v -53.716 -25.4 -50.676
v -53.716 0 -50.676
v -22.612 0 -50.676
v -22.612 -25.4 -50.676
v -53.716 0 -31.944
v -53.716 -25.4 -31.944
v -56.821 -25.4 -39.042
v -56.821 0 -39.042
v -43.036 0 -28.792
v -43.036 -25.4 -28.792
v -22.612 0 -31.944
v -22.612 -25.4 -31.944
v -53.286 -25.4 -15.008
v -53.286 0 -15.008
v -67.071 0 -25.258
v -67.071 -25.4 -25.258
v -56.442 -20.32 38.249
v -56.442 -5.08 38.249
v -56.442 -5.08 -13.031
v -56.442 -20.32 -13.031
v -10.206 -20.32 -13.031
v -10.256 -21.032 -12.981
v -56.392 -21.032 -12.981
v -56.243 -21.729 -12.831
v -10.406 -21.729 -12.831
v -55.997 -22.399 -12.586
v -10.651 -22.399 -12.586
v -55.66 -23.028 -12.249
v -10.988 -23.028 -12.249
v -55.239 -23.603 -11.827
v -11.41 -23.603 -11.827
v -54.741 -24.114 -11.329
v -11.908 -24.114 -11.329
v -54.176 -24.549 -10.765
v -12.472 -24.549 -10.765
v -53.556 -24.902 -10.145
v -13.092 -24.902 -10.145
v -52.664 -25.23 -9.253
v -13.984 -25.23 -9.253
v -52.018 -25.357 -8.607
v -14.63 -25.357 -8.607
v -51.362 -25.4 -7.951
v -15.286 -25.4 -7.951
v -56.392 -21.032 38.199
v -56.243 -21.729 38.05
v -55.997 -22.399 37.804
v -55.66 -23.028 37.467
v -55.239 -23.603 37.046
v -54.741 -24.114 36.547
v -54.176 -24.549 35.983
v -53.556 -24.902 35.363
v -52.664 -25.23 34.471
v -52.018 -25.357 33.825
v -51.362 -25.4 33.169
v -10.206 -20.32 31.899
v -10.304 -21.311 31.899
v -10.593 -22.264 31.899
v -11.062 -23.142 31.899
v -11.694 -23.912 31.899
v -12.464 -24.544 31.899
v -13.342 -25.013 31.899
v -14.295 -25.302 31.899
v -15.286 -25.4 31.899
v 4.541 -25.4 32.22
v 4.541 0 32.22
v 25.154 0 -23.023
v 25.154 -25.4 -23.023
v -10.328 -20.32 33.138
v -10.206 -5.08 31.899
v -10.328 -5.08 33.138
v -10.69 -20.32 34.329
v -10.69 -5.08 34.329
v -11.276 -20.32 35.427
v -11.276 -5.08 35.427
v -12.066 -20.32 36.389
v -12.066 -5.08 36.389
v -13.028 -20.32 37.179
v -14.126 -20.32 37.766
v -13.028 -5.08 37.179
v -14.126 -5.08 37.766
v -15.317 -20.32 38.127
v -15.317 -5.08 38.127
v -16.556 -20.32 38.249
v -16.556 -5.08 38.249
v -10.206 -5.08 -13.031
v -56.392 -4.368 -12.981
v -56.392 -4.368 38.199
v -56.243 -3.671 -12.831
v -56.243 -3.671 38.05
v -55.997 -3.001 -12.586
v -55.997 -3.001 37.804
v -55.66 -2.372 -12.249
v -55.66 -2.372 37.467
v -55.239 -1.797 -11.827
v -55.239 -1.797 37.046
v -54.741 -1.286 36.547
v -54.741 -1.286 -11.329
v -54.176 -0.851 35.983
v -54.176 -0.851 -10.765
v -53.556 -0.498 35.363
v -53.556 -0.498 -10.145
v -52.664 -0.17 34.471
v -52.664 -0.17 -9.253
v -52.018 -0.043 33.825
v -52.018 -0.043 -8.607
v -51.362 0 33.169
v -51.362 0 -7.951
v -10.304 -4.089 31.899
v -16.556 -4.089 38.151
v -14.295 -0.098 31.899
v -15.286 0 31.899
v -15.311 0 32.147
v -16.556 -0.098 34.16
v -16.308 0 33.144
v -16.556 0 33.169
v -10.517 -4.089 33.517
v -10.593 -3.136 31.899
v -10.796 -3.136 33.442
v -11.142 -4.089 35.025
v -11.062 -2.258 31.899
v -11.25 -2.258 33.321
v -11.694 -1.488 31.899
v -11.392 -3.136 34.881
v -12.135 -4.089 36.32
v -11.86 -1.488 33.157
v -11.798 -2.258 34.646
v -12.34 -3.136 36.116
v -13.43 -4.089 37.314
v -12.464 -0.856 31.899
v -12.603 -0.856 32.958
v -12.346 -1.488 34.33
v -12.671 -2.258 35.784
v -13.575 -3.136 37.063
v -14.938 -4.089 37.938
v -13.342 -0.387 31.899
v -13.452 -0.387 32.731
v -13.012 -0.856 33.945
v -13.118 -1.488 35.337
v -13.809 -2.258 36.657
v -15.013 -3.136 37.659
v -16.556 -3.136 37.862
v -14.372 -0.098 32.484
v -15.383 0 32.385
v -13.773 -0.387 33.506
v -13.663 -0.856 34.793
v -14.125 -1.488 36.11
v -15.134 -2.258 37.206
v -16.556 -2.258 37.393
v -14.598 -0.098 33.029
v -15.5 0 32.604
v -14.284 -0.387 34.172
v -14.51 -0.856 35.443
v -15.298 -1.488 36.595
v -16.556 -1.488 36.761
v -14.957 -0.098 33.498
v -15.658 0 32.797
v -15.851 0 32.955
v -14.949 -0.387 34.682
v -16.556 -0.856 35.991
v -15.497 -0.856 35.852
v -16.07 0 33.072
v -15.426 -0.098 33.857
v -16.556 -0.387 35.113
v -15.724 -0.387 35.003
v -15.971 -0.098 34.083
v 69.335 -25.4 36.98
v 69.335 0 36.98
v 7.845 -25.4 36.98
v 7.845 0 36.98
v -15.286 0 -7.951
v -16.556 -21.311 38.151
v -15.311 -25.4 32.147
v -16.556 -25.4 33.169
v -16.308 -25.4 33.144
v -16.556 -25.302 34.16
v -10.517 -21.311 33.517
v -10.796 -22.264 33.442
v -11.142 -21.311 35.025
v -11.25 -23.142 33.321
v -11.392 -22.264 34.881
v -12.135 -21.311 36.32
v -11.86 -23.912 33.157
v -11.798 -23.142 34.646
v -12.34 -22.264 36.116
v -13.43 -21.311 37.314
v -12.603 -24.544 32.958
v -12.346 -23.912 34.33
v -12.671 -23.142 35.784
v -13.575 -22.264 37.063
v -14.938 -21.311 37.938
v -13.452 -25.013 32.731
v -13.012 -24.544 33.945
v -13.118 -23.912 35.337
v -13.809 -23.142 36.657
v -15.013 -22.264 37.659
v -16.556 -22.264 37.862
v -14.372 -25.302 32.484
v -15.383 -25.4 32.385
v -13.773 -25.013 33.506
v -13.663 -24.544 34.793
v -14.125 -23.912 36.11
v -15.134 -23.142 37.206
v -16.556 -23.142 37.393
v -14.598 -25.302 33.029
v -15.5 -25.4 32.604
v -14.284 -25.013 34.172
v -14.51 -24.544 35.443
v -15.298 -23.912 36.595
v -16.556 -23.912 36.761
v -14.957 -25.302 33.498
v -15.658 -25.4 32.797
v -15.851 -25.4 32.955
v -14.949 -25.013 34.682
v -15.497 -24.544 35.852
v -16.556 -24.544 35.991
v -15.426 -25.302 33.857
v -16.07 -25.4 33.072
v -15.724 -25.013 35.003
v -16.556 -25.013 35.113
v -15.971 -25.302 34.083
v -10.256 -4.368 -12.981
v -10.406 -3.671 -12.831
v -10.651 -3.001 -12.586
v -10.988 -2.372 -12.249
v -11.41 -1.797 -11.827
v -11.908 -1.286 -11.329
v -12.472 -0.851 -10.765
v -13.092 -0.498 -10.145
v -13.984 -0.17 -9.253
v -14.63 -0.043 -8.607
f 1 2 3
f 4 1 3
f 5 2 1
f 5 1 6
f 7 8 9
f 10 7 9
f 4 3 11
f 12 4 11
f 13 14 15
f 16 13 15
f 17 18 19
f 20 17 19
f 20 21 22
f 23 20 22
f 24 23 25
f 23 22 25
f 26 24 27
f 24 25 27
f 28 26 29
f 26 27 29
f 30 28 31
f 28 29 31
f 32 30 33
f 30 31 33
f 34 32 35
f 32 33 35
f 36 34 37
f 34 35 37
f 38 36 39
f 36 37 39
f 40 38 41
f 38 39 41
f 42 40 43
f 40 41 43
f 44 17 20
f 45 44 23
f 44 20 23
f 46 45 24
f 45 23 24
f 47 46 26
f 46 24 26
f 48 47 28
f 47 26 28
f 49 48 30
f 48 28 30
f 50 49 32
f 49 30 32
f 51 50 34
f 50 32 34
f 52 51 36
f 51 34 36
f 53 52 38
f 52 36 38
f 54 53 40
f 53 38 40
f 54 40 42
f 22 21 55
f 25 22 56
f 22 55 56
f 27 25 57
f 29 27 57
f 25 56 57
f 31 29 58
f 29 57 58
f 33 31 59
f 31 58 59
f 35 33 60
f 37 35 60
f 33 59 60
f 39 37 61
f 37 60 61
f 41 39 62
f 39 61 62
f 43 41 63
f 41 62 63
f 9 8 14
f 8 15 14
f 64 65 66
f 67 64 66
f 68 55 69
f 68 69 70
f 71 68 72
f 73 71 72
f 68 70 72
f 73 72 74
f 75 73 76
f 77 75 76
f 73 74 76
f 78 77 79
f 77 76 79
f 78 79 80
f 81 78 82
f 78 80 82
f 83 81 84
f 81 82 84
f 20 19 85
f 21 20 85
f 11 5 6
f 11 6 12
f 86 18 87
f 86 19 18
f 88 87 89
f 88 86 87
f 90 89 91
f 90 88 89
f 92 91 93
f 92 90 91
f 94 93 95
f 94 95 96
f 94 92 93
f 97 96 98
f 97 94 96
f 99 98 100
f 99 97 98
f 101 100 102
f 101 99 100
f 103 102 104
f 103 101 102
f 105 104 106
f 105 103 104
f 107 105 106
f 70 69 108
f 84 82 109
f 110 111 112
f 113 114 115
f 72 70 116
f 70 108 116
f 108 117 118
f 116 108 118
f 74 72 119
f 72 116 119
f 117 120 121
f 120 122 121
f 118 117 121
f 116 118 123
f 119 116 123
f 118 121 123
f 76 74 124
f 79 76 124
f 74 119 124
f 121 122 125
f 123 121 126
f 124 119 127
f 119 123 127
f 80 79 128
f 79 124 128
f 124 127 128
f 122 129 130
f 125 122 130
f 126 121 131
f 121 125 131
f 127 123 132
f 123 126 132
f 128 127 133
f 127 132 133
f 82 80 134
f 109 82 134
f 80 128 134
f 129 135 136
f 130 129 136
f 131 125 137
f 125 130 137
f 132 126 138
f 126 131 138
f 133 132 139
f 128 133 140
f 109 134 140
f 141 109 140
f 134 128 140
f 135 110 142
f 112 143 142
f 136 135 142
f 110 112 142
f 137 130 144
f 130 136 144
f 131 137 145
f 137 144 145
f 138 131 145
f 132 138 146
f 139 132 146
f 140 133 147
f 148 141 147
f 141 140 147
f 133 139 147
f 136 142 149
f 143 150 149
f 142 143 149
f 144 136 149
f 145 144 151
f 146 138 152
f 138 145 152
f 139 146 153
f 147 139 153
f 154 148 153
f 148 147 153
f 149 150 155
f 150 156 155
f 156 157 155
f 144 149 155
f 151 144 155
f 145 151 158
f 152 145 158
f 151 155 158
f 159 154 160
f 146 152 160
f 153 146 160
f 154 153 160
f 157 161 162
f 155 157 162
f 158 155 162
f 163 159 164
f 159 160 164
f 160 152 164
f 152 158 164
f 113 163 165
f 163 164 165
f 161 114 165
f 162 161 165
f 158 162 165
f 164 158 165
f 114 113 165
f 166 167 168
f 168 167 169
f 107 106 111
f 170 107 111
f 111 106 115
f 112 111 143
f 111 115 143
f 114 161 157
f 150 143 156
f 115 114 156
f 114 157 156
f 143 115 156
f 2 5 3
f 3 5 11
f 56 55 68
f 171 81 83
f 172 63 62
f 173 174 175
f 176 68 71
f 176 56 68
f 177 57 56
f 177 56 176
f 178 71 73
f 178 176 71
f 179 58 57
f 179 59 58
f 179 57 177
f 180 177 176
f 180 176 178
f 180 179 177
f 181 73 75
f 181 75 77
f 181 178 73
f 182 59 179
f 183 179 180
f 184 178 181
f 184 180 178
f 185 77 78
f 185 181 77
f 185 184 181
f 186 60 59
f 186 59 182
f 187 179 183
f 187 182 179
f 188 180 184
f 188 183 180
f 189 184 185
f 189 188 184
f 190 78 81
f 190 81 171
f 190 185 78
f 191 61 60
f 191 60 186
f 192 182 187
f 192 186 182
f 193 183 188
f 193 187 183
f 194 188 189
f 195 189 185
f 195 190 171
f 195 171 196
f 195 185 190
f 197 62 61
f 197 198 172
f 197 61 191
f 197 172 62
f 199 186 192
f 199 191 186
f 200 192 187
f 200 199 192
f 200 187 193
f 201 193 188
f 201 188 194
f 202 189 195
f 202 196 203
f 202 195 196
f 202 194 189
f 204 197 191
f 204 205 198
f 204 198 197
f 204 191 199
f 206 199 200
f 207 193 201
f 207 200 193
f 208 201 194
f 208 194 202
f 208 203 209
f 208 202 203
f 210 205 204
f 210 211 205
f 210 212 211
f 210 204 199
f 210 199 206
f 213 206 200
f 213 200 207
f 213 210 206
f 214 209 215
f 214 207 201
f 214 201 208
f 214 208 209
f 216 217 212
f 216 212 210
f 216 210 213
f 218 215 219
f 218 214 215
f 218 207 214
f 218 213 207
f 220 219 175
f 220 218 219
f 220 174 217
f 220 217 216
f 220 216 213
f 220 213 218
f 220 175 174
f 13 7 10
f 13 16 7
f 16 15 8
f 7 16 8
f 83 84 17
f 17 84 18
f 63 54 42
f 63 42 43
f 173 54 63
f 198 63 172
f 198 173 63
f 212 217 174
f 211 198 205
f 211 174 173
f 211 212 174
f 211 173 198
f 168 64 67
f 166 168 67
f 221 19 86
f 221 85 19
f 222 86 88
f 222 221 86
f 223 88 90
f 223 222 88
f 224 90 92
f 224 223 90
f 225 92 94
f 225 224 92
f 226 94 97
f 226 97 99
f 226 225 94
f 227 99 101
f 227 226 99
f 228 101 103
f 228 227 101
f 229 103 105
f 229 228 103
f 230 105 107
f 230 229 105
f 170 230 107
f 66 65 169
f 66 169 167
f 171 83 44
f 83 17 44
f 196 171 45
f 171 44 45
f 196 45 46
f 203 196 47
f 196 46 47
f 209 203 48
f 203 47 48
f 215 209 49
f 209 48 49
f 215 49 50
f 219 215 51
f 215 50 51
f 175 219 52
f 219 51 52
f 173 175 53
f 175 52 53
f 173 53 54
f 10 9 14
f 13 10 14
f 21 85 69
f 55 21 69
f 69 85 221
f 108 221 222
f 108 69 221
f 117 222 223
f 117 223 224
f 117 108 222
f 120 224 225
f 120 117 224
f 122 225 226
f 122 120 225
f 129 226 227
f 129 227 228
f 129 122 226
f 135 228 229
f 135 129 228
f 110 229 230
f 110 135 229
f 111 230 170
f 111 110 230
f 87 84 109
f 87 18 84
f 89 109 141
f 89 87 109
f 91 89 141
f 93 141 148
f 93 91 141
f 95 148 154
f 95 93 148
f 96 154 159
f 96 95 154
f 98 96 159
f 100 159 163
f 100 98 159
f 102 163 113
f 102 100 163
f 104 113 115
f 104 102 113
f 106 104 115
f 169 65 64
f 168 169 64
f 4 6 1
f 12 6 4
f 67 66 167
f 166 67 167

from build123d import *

# Parameters (mm, degrees)
F1_DEPTH = 25.4
F2_W     = 31.103589
F2_H     = 18.732842
F3_DEPTH = 25.4
F4_R     = 5.08
F5_SIZE  = 5.08


with BuildPart() as f1:
    # F0 (on Front) → F1 (new body)
    with BuildSketch(Plane.XZ):
        with BuildLine():
            Line((-56.441986, -13.030786), (-10.206229, -13.030786))
            Line((-10.206229, -13.030786), (-10.206229, 31.898874))
            ThreePointArc((-10.206229, 31.898874), (-12.066101, 36.389002), (-16.556229, 38.248874))
            Line((-16.556229, 38.248874), (-56.441986, 38.248874))
            Line((-56.441986, 38.248874), (-56.441986, -13.030786))
        make_face()
        Polygon((69.33511, 36.979739), (2.765061, 36.979739), (25.15409, -23.022867), align=None)
        Polygon((-56.820964, -39.042376), (-43.036418, -28.792329), (-53.286465, -15.007783), (-67.071011, -25.25783), align=None)
    extrude(amount=F1_DEPTH)

    # F4
    f4_edges = [f1.edges().sort_by_distance(p)[0] for p in [
        (-33.324108, -25.4, -13.030786),
        (-56.441986, -25.4, 12.609044),
        (-10.206229, -25.4, 9.434044),
        (-10.206229, 0, 9.434044),
        (-33.324108, 0, -13.030786),
        (-56.441986, 0, 12.609044),
    ]]
    fillet(f4_edges, radius=F4_R)

    # F5
    f5_edges = [f1.edges().sort_by_distance(p)[0] for p in [
        (2.765061, -12.7, 36.979739),
    ]]
    chamfer(f5_edges, length=F5_SIZE)


with BuildPart() as f3:
    # F2 (on Front) → F3 (new body)
    with BuildSketch(Plane.XZ):
        with Locations((-38.163881, -41.309921)):
            Rectangle(F2_W, F2_H)
    extrude(amount=F3_DEPTH)


solid = Compound([f1.part, f3.part])
